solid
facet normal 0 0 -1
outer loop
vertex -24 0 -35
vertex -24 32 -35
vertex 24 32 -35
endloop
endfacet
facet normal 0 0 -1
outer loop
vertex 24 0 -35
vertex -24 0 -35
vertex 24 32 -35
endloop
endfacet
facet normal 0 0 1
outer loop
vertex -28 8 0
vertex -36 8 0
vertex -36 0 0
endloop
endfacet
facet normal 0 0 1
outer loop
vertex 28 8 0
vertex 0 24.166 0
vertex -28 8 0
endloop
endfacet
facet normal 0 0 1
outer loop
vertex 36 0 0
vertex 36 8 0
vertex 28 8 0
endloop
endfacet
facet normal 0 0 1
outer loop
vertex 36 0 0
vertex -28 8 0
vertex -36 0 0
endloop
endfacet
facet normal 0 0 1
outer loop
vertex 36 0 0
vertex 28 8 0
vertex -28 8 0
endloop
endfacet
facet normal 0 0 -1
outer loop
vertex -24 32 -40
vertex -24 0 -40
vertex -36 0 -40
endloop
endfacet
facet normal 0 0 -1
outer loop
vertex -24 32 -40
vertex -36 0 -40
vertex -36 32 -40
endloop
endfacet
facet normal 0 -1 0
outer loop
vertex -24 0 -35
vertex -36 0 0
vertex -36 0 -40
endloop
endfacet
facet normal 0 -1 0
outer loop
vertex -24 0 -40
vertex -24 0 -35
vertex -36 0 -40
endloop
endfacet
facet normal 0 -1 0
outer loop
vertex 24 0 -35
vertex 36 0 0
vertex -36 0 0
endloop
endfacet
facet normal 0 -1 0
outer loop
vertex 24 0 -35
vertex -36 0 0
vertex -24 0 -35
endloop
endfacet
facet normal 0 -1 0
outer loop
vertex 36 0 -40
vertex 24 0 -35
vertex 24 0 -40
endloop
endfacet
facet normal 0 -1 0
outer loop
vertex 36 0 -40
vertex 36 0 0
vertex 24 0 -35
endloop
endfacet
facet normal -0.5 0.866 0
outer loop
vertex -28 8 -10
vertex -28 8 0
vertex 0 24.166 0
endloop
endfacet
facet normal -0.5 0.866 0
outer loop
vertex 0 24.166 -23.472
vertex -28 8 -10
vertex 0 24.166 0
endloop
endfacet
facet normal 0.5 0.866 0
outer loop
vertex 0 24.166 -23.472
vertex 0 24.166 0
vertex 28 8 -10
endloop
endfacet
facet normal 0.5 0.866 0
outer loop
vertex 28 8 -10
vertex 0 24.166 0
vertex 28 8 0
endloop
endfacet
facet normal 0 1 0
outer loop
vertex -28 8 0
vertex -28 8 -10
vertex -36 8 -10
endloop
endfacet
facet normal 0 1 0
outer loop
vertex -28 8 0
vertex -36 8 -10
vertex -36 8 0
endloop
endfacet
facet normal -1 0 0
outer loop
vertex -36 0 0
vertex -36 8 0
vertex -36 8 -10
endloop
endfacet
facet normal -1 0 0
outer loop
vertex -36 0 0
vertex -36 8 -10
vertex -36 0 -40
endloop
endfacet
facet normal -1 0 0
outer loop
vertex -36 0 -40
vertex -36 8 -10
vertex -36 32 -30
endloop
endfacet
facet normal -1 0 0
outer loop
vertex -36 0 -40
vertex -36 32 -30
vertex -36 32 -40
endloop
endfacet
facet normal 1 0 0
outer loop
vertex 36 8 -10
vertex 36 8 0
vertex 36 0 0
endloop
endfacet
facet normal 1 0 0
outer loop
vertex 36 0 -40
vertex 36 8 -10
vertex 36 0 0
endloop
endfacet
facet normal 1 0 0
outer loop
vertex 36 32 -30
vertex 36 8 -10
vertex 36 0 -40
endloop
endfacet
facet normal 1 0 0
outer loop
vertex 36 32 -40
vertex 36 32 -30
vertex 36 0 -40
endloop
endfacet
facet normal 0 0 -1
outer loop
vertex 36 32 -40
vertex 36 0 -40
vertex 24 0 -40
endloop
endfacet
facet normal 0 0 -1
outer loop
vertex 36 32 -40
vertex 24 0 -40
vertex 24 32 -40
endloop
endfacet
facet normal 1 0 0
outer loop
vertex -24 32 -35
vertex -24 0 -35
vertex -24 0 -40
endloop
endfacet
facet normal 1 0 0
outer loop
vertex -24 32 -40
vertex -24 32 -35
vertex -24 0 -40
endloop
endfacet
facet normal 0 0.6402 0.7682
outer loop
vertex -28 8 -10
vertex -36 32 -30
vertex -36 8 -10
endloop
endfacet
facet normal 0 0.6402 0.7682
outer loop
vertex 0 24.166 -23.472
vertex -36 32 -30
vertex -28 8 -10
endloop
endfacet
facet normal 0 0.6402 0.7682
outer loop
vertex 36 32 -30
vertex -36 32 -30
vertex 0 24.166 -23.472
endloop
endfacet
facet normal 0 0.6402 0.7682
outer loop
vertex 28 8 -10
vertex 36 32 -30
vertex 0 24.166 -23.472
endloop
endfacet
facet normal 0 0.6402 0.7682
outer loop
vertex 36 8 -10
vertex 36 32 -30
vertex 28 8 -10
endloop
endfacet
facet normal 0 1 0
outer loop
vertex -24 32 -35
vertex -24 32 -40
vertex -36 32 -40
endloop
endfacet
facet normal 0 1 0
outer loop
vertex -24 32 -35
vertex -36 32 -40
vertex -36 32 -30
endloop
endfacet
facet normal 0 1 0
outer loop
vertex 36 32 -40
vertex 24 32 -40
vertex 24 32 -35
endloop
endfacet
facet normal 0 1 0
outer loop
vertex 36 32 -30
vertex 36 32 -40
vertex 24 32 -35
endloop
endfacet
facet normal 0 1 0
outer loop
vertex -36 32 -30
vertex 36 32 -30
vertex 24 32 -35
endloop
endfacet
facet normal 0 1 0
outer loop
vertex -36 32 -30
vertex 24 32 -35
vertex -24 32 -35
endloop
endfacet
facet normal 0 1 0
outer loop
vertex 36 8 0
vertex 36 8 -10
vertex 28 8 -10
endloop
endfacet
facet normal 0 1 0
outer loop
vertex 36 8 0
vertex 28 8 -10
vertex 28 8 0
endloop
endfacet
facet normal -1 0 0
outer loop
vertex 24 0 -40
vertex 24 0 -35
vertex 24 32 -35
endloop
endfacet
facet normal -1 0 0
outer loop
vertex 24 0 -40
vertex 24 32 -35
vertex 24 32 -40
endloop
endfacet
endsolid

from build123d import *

# Parameters (mm, degrees)
EXTRUDE_1_DEPTH     = 36
EXTRUDE_2_REACH     = 64.61
SKETCH_3_W          = 48
SKETCH_3_H          = 5
CUT_EXTRUDE_3_DEPTH = 63.60990337


with BuildPart() as part:
    # 草圖1 → 伸長1 (new, symmetric)
    with BuildSketch(Plane(origin=(0, 0, 0), x_dir=(0, 0, -1), z_dir=(1, 0, 0))):
        Polygon((0, 0), (40, 0), (40, 32), (30, 32), (10, 8), (0, 8), align=None)
    extrude(amount=EXTRUDE_1_DEPTH, both=True)

    # 伸長2: up to this plane
    extrude_2_end = Plane(origin=(36, 8, -10), z_dir=(0, -0.6401843996644799, -0.7682212795973757))
    # 草圖2 → 伸長2 (add, up to the surface)
    with BuildSketch(Plane.XY, mode=Mode.PRIVATE) as extrude_2_sk1:
        Polygon((28, 8), (-28, 8), (0, 24.165807537), align=None)
    extrude_2_tool1 = split(extrude(extrude_2_sk1.sketch, amount=-EXTRUDE_2_REACH, mode=Mode.PRIVATE), bisect_by=extrude_2_end, keep=Keep.BOTH, mode=Mode.PRIVATE)
    add(extrude_2_tool1.solids().sort_by_distance((0, 13.388603, 0))[0])

    # 草圖3 → 伸長3 (cut, through all)
    with BuildSketch(Plane(origin=(0, 32, 0), x_dir=(1, 0, 0), z_dir=(0, 1, 0))):
        with Locations((0, 37.5)):
            Rectangle(SKETCH_3_W, SKETCH_3_H)
    extrude(amount=-CUT_EXTRUDE_3_DEPTH, mode=Mode.SUBTRACT)


solid = part.part
